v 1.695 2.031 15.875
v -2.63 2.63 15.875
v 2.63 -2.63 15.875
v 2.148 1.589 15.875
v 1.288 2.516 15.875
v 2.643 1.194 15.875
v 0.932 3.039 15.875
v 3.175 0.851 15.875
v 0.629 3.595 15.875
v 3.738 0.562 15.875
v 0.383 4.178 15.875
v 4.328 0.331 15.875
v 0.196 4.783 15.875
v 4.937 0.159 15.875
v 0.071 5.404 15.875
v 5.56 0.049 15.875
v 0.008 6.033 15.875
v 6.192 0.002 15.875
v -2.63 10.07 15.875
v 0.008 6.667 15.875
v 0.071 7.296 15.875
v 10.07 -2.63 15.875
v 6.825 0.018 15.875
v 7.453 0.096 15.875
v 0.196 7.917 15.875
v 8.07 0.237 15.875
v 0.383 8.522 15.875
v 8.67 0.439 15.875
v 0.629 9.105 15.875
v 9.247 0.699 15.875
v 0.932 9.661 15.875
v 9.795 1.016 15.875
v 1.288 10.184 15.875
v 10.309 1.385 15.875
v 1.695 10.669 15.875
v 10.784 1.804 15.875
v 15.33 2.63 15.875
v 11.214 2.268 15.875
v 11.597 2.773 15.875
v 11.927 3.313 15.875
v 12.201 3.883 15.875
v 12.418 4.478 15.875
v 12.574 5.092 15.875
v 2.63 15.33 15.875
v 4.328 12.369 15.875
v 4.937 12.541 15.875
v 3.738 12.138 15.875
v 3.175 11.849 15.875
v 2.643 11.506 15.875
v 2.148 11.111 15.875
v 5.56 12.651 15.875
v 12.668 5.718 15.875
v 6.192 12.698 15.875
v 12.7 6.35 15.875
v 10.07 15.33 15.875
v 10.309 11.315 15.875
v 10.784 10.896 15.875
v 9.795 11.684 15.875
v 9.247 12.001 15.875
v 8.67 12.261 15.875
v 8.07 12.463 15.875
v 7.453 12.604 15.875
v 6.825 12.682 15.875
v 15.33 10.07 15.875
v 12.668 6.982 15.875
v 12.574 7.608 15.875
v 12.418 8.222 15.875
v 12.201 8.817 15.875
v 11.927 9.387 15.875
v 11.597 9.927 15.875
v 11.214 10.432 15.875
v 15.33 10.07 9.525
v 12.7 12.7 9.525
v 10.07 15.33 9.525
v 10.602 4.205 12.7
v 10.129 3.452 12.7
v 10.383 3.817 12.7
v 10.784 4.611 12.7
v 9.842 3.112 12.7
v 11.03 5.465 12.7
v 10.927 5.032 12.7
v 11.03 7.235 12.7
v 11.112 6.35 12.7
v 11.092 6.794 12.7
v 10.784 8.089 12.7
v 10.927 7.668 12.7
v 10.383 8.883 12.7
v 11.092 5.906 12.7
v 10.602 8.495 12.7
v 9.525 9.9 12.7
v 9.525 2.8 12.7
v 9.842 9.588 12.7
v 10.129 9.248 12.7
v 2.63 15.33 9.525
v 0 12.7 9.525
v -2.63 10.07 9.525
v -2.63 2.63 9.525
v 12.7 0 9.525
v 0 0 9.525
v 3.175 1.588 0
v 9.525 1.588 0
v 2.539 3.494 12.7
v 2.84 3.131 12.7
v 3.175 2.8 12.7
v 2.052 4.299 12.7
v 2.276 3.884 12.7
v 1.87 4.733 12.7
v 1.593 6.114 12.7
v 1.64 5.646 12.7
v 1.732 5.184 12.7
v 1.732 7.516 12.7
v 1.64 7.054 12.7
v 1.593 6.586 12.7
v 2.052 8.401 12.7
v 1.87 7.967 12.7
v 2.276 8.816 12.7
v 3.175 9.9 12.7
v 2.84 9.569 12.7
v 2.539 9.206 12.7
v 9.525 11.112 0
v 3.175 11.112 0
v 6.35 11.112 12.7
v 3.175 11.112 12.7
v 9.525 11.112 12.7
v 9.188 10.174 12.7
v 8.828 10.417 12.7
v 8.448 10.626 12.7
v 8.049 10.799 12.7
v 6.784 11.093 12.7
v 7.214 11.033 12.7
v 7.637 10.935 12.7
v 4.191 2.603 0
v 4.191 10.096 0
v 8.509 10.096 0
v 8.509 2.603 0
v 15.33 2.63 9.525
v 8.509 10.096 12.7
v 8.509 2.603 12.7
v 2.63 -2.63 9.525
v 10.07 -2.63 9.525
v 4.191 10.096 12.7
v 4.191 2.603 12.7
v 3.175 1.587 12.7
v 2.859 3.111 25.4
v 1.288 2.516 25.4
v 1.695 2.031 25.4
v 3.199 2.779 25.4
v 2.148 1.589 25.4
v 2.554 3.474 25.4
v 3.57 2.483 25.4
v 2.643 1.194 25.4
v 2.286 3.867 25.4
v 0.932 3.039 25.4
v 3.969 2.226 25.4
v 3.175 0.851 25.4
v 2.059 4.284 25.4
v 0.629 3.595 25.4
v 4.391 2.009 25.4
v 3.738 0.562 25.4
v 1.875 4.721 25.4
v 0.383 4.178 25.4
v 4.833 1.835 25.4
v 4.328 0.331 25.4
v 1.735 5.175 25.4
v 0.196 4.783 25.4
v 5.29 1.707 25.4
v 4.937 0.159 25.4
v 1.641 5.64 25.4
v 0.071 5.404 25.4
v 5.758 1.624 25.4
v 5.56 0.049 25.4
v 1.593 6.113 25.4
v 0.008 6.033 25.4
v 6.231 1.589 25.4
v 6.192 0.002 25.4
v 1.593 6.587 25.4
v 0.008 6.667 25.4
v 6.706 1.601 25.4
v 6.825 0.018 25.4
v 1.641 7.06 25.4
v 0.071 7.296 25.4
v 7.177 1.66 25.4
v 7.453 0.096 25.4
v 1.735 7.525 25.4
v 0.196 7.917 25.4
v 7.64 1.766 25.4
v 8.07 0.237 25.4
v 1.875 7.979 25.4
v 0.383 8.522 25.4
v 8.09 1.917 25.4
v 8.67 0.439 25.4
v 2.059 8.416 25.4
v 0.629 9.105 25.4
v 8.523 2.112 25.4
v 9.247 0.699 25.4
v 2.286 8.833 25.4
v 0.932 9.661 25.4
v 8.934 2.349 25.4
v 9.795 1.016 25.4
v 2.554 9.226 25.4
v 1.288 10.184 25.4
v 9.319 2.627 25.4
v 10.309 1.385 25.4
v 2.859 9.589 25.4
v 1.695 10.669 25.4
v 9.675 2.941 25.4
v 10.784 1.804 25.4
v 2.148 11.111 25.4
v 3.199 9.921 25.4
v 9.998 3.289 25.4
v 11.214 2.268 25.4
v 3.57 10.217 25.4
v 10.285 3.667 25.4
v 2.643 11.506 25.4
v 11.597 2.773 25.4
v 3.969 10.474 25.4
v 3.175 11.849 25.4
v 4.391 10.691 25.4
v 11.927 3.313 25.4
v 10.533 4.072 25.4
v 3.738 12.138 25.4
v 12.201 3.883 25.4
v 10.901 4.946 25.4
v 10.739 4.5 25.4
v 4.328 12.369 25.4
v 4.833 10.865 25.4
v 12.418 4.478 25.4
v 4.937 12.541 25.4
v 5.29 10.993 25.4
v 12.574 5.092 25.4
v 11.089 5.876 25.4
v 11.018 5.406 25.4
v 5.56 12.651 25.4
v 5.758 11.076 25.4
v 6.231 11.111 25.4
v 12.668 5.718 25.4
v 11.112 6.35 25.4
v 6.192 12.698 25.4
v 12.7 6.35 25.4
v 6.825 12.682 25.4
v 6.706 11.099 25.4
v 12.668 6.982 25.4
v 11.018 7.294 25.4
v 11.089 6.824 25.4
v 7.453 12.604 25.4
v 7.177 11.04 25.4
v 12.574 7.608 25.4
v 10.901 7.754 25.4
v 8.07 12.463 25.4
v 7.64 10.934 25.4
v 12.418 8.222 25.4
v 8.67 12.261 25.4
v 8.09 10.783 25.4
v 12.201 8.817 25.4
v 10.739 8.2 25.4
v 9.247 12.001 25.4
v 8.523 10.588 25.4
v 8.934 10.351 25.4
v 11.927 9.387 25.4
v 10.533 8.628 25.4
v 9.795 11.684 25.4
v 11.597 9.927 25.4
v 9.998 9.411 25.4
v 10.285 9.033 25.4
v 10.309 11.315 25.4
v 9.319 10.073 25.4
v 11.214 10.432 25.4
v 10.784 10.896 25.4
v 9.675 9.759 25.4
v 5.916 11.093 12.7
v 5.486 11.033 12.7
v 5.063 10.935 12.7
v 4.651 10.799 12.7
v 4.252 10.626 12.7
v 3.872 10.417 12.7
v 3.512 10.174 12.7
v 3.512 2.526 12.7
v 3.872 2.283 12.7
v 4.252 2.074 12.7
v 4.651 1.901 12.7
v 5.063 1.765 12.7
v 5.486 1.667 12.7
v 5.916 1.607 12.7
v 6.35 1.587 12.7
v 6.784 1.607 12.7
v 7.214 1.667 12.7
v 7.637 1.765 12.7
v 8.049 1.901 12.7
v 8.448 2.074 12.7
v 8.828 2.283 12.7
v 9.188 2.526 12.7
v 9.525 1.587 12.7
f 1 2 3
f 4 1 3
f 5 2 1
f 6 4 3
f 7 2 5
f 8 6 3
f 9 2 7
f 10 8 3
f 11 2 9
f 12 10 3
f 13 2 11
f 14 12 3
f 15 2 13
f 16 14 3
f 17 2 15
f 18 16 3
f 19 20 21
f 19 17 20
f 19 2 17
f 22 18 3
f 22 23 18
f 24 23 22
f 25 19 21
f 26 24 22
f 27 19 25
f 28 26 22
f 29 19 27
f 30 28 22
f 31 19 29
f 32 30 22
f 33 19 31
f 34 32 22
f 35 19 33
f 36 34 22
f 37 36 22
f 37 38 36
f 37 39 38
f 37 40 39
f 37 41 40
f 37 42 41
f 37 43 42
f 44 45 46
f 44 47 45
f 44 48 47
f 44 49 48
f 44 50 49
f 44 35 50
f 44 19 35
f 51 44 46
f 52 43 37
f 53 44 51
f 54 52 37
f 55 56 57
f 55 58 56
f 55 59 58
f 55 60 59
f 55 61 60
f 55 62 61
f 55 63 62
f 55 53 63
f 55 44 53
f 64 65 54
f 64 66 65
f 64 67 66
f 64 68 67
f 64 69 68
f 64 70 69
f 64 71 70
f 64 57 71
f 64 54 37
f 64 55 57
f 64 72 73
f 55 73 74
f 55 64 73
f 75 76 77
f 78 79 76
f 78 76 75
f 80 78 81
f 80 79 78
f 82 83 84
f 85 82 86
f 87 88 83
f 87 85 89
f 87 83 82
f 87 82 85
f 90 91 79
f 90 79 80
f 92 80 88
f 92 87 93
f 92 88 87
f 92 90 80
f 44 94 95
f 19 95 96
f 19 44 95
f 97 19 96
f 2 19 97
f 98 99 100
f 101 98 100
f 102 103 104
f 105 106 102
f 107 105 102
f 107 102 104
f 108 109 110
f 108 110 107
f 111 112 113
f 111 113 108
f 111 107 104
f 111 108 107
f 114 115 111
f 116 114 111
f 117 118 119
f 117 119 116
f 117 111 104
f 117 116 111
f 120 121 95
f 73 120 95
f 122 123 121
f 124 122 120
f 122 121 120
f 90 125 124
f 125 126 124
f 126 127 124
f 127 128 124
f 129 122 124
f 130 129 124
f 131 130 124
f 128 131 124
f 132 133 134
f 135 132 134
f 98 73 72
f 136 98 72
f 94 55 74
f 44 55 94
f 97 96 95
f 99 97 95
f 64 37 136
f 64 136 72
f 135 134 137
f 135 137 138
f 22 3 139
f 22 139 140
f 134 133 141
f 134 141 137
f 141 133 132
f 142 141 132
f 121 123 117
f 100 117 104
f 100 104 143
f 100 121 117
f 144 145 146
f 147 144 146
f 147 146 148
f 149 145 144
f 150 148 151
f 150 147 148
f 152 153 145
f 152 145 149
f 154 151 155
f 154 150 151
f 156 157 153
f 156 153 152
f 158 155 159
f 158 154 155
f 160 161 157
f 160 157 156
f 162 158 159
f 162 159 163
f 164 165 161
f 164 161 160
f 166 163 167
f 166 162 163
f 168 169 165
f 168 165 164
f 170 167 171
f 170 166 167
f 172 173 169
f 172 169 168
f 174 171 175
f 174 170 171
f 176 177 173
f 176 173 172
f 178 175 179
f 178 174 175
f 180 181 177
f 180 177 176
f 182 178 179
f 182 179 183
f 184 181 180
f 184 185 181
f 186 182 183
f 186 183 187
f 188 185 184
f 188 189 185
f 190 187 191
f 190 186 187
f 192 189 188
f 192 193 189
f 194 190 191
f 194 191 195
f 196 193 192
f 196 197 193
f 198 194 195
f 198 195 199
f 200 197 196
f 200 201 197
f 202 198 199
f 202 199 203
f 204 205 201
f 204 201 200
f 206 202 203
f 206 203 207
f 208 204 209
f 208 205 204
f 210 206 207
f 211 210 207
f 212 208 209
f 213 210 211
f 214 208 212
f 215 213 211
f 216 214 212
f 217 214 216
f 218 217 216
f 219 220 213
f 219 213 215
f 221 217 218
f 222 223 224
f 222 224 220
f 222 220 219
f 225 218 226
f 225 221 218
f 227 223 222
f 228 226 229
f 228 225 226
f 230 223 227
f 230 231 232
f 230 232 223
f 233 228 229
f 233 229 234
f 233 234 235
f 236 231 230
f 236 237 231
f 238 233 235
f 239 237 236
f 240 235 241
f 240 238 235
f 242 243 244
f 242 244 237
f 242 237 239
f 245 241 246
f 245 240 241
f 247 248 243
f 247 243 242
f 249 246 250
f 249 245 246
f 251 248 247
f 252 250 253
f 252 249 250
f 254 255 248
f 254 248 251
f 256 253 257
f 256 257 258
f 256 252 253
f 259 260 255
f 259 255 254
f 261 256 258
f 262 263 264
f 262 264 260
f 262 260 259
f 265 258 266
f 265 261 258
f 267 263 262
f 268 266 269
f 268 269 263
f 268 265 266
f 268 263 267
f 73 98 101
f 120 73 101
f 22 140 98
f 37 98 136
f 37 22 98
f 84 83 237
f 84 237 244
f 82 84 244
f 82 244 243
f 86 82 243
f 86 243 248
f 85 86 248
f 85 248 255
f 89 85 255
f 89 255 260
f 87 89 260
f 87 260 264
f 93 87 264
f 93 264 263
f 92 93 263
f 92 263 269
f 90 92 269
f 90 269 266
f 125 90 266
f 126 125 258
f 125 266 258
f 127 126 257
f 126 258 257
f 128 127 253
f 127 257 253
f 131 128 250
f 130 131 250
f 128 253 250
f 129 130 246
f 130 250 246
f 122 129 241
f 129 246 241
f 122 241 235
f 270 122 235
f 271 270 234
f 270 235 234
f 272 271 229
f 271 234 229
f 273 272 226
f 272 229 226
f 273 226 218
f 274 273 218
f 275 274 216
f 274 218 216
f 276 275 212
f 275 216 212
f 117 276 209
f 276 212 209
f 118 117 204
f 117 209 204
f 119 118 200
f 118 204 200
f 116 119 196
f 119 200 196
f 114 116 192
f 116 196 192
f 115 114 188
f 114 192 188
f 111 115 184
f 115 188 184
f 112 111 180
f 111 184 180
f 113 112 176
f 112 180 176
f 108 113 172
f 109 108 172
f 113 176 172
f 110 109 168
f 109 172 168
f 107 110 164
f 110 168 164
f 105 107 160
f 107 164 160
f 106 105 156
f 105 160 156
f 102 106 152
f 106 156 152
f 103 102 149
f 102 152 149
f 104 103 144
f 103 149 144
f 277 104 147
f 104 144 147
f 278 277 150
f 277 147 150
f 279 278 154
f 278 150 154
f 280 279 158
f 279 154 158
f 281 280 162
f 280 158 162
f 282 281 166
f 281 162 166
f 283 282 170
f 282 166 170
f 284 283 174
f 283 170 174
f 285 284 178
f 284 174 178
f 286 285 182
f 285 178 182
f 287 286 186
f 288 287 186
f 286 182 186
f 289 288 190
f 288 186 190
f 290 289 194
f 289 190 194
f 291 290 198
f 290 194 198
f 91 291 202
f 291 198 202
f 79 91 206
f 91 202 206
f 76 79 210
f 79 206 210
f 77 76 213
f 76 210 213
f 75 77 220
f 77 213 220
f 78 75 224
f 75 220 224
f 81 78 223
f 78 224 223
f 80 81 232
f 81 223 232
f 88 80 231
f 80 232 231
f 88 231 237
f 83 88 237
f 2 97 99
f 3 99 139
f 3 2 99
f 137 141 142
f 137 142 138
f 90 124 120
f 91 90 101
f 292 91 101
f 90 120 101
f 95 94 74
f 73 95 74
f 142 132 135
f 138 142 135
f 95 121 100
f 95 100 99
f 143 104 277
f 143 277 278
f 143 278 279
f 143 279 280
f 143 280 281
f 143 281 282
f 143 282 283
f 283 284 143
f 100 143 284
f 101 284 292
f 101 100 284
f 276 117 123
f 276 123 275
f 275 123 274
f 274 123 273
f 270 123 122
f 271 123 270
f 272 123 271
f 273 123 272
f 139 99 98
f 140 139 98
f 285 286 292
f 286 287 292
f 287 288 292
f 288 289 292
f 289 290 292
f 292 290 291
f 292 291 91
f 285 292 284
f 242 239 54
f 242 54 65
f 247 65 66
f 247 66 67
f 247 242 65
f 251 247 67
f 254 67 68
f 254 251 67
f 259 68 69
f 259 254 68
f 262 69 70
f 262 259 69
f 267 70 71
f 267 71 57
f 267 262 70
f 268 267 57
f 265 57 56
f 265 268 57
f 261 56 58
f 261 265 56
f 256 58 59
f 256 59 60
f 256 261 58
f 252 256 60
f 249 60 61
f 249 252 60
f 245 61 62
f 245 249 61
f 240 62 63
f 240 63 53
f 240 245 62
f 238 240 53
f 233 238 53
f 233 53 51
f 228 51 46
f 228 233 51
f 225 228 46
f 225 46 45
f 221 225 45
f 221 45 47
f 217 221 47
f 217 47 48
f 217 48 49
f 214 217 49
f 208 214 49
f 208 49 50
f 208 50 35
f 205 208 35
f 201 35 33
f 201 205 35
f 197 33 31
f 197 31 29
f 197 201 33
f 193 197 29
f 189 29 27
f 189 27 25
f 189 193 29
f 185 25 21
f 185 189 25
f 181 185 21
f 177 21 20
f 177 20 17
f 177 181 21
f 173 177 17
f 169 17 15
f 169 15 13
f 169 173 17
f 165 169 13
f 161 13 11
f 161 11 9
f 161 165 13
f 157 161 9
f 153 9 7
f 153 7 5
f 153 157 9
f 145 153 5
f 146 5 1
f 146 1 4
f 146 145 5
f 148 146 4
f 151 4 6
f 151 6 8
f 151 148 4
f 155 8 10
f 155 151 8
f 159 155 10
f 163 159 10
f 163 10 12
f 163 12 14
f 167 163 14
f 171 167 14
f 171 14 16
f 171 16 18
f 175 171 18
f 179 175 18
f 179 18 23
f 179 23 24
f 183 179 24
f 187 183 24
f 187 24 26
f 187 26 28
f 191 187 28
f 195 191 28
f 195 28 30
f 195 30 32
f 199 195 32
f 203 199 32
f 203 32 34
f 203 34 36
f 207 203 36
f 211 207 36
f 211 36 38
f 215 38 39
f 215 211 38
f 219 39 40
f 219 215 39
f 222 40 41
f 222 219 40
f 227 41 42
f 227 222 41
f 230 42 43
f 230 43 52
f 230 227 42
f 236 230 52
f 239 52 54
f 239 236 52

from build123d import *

# Parameters (mm, degrees)
F0_W      = 12.7
F0_H      = 12.7
F1_DEPTH  = 25.4
F3_DEPTH  = 12.701
F5_DEPTH  = 12.701
F6_W      = 6.35
F6_H      = 9.525
F6_W_2    = 4.318
F6_H_2    = 7.493
F7_DEPTH  = 25.401
F9_DEPTH  = 15.875
F10_R     = 6.35
F11_DEPTH = 9.525
F12_R     = 6.35
F12_R_2   = 4.7625
F13_DEPTH = 12.7
F14_R     = 4.7625
F14_W     = 4.318
F14_H     = 7.493
F15_DEPTH = 12.7


with BuildPart() as f1:
    # F0 (on Top) → F1 (new body)
    with BuildSketch(Plane.XY):
        with Locations((6.35, 6.35)):
            Rectangle(F0_W, F0_H)
    extrude(amount=F1_DEPTH)

    # F2 (on face) → F3 (cut, through all)
    with BuildSketch(Plane.XZ):
        Polygon((0, 0), (3.175, 0), (0, 9.525), align=None)
        Polygon((12.7, 0), (12.7, 9.525), (9.525, 0), align=None)
    extrude(amount=-F3_DEPTH, mode=Mode.SUBTRACT)

    # F4 (on face) → F5 (cut, through all)
    with BuildSketch(Plane(origin=(0, 0, 0), x_dir=(0, -1, 0), z_dir=(-1, 0, 0))):
        Polygon((-11.1125, 0), (-12.7, 9.525), (-12.7, 0), align=None)
        Polygon((0, 0), (0, 9.525), (-1.5875, 0), align=None)
    extrude(amount=-F5_DEPTH, mode=Mode.SUBTRACT)

    # F6 (on face) → F7 (cut, through all)
    with BuildSketch(Plane(origin=(0, 0, 0), x_dir=(1, 0, 0), z_dir=(0, 0, -1))):
        with Locations((6.35, -6.35)):
            Rectangle(F6_W, F6_H)
        with Locations((6.35, -6.35)):
            Rectangle(F6_W_2, F6_H_2, mode=Mode.SUBTRACT)
    extrude(amount=-F7_DEPTH, mode=Mode.SUBTRACT)

    # F8 (on face) → F9 (join)
    with BuildSketch(Plane.XY.offset(25.4)):
        Polygon((0, 0), (0, 12.7), (-2.6302561211, 10.0697438789), (-2.6302561211, 2.6302561211), align=None)
        Polygon((10.0697438789, 15.3302561211), (2.6302561211, 15.3302561211), (0, 12.7), (12.7, 12.7), align=None)
        Polygon((15.3302561211, 10.0697438789), (12.7, 12.7), (12.7, 0), (15.3302561211, 2.6302561211), align=None)
        Polygon((12.7, 0), (0, 0), (2.6302561211, -2.6302561211), (10.0697438789, -2.6302561211), align=None)
    extrude(amount=-F9_DEPTH)

    # F10 (on face) → F11 (cut)
    with BuildSketch(Plane.XY.offset(25.4)):
        Polygon((2.6302561211, 15.3302561211), (-2.6302561211, 10.0697438789), (-2.6302561211, 2.6302561211), (2.6302561211, -2.6302561211), (10.0697438789, -2.6302561211), (15.3302561211, 2.6302561211), (15.3302561211, 10.0697438789), (10.0697438789, 15.3302561211), align=None)
        with Locations((6.35, 6.35)):
            Circle(F10_R, mode=Mode.SUBTRACT)
    extrude(amount=-F11_DEPTH, mode=Mode.SUBTRACT)

    # F12 (on face) → F13 (join)
    with BuildSketch(Plane.XY.offset(25.4)):
        with Locations((6.35, 6.35)):
            Circle(F12_R)
        with Locations((6.35, 6.35)):
            Circle(F12_R_2, mode=Mode.SUBTRACT)
    extrude(amount=-F13_DEPTH)

    # F14 (on face) → F15 (cut)
    with BuildSketch(Plane.XY.offset(25.4)):
        with Locations((6.35, 6.35)):
            Circle(F14_R)
        with Locations((6.35, 6.35)):
            Rectangle(F14_W, F14_H, mode=Mode.SUBTRACT)
        with Locations((6.35, 6.35)):
            Rectangle(F14_W, F14_H)
    extrude(amount=-F15_DEPTH, mode=Mode.SUBTRACT)


solid = f1.part
